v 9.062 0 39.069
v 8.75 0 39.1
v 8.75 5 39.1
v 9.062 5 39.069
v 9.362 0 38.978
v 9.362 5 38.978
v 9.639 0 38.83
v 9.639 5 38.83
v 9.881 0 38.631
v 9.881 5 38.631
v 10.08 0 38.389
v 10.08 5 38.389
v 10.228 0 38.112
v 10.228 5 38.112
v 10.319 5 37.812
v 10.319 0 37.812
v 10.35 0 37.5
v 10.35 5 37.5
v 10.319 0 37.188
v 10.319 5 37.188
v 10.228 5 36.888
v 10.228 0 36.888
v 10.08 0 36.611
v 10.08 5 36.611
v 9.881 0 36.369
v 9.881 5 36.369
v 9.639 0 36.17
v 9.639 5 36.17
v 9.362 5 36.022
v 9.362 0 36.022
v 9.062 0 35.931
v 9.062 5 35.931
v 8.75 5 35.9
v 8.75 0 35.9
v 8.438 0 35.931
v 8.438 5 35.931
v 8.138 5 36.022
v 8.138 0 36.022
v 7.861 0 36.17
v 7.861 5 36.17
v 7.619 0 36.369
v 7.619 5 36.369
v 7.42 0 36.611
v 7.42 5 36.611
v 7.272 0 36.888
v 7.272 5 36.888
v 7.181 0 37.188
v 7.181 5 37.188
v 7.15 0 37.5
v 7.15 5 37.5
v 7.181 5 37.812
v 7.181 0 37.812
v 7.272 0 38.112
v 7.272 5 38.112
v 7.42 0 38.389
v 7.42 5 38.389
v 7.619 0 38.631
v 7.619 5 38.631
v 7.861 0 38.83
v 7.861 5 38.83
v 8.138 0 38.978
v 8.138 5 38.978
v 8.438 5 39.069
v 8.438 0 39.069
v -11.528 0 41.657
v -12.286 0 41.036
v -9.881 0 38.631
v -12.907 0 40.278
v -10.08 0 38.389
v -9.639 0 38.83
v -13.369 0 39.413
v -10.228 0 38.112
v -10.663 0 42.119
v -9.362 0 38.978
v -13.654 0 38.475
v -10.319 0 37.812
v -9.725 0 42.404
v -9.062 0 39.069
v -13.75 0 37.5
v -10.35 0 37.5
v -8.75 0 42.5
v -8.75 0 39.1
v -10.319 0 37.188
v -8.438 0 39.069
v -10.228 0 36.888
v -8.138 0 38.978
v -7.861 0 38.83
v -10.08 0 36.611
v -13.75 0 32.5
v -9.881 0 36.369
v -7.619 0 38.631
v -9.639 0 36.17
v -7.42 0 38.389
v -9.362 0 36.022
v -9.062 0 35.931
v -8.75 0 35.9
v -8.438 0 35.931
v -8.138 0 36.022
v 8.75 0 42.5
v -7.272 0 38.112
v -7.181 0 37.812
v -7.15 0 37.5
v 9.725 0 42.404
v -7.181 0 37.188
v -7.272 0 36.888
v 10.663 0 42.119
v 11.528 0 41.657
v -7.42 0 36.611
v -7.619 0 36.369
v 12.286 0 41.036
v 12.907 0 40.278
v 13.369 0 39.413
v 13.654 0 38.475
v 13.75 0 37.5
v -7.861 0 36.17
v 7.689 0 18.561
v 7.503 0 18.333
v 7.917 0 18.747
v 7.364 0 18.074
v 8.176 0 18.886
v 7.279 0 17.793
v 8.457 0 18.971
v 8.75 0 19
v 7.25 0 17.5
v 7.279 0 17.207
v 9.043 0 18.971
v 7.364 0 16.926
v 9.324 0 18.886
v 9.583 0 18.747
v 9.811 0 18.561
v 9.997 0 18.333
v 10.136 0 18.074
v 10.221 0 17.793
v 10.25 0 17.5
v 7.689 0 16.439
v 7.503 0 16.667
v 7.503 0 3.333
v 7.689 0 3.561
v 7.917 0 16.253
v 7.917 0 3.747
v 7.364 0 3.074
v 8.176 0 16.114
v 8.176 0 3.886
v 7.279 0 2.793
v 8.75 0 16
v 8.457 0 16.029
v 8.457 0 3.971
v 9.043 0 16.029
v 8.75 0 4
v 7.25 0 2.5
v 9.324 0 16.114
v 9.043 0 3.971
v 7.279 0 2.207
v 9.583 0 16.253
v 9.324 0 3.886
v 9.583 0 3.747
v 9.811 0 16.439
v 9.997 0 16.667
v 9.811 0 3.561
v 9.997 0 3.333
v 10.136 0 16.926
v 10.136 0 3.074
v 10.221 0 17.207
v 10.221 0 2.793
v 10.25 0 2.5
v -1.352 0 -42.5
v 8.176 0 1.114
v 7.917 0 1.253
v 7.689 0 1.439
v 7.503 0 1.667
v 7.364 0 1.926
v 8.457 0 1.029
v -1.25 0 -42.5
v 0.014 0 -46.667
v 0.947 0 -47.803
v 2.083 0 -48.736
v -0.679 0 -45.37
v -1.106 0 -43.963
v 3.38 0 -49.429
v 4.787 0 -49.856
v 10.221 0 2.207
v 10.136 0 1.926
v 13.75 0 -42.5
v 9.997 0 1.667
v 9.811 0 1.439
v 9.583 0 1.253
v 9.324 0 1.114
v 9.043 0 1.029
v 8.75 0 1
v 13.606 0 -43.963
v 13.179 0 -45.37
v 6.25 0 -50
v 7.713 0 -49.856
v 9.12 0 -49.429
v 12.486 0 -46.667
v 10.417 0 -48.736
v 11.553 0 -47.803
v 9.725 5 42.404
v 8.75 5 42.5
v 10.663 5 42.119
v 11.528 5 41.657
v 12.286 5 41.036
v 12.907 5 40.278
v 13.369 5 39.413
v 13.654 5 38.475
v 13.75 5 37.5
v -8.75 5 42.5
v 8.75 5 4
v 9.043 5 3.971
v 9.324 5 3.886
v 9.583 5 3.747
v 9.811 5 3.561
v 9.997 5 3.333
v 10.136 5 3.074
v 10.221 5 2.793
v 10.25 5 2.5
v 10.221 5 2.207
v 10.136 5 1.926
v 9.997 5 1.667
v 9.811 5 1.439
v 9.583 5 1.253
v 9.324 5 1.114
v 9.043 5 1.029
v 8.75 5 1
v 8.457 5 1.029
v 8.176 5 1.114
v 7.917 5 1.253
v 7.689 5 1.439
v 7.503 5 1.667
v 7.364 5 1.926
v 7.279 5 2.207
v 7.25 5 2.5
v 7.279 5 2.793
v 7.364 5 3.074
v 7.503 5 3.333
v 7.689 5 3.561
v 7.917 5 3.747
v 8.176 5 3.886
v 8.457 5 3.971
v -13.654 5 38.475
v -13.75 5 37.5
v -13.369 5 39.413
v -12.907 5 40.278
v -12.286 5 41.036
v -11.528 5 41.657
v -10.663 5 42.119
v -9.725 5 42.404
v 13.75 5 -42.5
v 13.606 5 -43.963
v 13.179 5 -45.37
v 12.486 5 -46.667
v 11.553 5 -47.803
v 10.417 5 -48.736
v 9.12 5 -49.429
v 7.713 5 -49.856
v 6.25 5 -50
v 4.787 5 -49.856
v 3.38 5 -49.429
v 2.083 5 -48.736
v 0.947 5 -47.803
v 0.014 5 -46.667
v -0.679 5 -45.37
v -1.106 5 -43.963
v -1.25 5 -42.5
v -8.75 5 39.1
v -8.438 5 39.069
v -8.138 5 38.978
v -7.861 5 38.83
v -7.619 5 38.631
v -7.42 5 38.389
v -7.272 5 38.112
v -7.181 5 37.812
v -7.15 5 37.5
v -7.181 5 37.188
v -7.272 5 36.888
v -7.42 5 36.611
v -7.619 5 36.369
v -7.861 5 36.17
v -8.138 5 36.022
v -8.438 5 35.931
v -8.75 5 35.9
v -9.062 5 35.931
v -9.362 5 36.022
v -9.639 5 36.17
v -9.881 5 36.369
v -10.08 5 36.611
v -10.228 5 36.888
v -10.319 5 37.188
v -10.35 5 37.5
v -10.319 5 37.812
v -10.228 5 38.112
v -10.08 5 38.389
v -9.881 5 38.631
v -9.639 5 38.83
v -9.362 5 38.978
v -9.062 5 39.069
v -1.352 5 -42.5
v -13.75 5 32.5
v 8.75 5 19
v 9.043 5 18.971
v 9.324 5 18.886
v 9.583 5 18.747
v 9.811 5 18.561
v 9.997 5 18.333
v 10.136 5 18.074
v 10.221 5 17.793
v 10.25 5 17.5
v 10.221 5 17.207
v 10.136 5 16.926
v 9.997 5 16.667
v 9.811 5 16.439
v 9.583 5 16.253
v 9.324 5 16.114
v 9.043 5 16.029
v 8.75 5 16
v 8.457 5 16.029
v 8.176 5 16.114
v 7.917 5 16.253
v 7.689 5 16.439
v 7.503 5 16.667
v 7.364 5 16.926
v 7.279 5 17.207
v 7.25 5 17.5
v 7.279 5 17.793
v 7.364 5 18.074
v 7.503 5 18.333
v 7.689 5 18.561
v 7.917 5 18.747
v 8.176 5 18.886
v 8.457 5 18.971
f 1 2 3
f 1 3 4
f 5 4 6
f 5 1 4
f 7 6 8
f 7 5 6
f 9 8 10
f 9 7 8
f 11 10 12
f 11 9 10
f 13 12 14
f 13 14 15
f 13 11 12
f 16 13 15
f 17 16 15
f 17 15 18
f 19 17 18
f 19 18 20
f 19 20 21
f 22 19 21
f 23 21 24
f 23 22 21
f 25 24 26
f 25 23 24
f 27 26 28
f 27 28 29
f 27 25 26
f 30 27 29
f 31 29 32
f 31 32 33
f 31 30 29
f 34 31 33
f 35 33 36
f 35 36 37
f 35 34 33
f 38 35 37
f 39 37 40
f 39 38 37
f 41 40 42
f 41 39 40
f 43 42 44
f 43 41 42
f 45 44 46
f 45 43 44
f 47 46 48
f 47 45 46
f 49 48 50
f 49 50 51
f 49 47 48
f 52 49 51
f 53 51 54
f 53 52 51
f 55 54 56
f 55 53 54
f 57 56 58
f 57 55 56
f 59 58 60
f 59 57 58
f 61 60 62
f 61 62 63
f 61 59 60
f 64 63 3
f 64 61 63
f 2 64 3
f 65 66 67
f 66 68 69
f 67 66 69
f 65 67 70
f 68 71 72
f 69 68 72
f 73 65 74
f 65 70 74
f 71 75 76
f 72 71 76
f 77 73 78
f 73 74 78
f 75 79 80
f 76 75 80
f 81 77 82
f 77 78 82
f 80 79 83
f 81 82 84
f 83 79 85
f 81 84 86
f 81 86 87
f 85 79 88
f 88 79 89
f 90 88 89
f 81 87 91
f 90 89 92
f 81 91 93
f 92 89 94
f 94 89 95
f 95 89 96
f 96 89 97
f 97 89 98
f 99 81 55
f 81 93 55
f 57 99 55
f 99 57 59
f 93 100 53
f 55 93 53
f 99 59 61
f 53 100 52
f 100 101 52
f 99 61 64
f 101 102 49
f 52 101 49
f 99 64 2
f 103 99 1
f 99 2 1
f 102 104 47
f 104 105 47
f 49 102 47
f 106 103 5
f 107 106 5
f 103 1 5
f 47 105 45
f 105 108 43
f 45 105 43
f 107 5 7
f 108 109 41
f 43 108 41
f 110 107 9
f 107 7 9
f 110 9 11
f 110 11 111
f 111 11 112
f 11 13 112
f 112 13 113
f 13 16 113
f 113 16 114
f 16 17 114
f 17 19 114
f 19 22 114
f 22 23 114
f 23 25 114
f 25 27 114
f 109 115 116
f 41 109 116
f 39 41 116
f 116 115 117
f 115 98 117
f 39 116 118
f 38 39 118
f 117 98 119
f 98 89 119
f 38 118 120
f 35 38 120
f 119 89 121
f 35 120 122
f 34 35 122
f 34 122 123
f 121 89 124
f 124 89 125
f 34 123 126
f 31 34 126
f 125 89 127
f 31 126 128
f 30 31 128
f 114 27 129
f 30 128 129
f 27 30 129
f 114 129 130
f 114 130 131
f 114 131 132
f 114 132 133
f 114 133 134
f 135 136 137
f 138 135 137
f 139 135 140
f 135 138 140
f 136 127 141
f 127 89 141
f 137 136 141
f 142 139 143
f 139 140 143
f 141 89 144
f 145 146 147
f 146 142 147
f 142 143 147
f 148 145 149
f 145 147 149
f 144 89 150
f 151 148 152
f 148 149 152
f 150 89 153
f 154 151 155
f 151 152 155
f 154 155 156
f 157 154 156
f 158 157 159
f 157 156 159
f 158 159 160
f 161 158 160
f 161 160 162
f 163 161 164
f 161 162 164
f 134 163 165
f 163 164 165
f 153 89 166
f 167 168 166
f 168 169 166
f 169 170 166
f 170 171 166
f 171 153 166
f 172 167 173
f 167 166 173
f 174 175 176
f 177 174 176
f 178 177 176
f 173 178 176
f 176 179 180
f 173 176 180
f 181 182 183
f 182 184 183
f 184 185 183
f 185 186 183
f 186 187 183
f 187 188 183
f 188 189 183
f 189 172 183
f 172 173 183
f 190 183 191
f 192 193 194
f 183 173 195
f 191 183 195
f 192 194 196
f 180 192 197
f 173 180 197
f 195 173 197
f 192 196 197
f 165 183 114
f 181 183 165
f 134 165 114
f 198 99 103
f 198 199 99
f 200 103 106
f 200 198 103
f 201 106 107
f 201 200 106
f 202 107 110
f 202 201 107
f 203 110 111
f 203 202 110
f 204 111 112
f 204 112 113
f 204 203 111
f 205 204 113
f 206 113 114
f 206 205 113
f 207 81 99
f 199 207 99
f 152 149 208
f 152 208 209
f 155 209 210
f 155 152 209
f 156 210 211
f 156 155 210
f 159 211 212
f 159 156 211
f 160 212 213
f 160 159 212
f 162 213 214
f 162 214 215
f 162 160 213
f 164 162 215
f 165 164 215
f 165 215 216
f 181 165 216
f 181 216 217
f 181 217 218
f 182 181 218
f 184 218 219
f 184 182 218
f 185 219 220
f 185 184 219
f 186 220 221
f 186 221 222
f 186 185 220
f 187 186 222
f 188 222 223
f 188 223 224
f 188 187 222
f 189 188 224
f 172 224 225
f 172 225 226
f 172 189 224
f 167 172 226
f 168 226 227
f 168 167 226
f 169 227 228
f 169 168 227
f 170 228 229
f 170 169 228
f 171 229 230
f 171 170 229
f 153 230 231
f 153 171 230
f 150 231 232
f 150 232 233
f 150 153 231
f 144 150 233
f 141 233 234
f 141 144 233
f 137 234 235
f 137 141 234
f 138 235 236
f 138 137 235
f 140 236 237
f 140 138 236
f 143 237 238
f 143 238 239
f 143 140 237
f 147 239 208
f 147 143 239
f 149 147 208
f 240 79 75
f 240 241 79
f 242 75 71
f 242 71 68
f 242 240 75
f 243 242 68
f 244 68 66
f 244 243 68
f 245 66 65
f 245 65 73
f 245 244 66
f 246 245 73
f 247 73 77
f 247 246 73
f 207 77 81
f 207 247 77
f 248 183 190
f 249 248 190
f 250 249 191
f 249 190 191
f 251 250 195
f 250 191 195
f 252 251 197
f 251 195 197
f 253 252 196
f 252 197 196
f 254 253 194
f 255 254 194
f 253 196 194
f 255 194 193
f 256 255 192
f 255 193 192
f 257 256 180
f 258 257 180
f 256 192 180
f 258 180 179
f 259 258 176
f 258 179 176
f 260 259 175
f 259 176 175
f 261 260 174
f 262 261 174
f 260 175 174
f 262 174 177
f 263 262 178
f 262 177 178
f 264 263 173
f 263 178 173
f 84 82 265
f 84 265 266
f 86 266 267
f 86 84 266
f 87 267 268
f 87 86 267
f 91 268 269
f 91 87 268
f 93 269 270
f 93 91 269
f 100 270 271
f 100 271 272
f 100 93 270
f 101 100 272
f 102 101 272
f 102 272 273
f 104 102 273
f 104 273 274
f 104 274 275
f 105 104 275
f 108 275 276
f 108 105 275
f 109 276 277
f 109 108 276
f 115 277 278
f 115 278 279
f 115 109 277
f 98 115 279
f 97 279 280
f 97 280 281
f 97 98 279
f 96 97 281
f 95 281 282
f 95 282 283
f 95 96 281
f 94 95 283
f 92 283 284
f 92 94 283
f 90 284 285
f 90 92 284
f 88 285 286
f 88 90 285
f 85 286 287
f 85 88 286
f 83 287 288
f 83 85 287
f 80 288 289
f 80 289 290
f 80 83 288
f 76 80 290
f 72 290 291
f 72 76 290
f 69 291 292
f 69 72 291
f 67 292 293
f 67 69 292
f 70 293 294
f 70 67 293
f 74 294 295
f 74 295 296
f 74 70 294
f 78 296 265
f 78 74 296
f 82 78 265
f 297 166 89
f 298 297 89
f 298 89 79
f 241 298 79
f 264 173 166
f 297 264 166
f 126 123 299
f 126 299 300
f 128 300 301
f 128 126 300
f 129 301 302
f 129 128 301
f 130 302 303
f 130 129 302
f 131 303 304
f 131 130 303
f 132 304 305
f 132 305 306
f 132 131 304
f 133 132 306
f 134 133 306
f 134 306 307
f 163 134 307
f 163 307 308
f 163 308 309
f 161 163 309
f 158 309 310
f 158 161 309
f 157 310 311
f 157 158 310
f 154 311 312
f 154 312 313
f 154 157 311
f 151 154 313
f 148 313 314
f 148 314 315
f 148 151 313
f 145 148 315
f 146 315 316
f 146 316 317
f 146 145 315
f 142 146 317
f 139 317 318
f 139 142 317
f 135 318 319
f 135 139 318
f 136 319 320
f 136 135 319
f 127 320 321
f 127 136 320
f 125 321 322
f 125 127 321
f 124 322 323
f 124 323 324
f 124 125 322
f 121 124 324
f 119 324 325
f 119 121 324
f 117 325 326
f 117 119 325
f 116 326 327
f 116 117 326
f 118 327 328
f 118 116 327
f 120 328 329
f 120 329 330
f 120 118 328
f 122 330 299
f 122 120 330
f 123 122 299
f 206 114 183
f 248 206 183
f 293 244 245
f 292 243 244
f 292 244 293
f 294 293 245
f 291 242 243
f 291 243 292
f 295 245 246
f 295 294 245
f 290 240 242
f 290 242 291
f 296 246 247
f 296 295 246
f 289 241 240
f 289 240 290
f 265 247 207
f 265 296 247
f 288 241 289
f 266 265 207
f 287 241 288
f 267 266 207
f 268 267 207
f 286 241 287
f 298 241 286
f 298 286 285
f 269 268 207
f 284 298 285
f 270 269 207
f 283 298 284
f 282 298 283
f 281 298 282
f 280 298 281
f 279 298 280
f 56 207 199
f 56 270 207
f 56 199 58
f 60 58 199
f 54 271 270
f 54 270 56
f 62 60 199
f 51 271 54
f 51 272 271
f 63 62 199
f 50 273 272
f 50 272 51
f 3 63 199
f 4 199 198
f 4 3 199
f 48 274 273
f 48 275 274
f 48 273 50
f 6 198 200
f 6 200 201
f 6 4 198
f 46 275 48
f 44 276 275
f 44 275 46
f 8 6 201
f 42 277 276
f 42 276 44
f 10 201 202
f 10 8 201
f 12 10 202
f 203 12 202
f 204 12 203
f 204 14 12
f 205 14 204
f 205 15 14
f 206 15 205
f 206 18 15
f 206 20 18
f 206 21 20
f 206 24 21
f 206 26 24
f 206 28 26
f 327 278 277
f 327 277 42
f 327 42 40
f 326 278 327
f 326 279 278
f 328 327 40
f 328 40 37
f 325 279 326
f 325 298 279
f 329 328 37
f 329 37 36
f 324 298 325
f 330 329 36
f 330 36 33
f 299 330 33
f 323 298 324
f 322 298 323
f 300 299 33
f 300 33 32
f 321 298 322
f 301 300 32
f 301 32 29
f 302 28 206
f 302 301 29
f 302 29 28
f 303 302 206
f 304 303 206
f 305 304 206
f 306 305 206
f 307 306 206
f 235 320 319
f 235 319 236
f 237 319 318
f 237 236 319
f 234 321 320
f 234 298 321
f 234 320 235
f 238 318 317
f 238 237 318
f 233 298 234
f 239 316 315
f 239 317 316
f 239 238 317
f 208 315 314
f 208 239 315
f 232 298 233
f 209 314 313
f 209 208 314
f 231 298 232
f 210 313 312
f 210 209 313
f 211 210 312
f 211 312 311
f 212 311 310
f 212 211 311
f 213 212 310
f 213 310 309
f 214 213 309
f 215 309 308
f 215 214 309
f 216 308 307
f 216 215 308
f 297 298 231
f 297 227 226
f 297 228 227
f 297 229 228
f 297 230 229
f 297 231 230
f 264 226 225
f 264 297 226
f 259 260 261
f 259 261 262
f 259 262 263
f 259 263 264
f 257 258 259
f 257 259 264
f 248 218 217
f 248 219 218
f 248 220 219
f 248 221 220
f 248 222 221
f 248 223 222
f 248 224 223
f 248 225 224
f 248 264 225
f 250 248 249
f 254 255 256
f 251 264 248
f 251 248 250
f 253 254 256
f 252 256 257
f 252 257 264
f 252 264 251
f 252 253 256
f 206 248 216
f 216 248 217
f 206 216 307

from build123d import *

# Parameters (mm, degrees)
SKETCH_1_R      = 1.6
SKETCH_1_R_2    = 1.5
EXTRUDE_1_DEPTH = 5
FILLET_1_R      = 5


with BuildPart() as part:
    # ｽｹｯﾁ1 → ﾎﾞｽ - 押し出し1 (new body)
    with BuildSketch(Plane(origin=(0, 0, 0), x_dir=(1, 0, 0), z_dir=(0, 1, 0))):
        with BuildLine():
            Line((-13.75, -32.5), (-13.75, -42.5))
            Line((-13.75, -42.5), (13.75, -42.5))
            Line((13.75, -42.5), (13.75, 42.5))
            ThreePointArc((13.75, 42.5), (6.25, 50), (-1.25, 42.5))
            Line((-1.25, 42.5), (-1.351786435, 42.5))
            Line((-1.351786435, 42.5), (-13.75, -32.5))
        make_face()
        with Locations(Location((-8.75, -37.5, 0), (0, 0, 270))):
            Circle(SKETCH_1_R, mode=Mode.SUBTRACT)
        with Locations(Location((8.75, -37.5, 0), (0, 0, 270))):
            Circle(SKETCH_1_R, mode=Mode.SUBTRACT)
        with Locations(Location((8.75, -17.5, 0), (0, 0, 270))):
            Circle(SKETCH_1_R_2, mode=Mode.SUBTRACT)
        with Locations(Location((8.75, -2.5, 0), (0, 0, 270))):
            Circle(SKETCH_1_R_2, mode=Mode.SUBTRACT)
    extrude(amount=EXTRUDE_1_DEPTH)

    # ﾌｨﾚｯﾄ1
    fillet_1_edges = [part.edges().sort_by_distance(p)[0] for p in [
        (13.75, 2.5, 42.5),
        (-13.75, 2.5, 42.5),
    ]]
    fillet(fillet_1_edges, radius=FILLET_1_R)


solid = part.part
